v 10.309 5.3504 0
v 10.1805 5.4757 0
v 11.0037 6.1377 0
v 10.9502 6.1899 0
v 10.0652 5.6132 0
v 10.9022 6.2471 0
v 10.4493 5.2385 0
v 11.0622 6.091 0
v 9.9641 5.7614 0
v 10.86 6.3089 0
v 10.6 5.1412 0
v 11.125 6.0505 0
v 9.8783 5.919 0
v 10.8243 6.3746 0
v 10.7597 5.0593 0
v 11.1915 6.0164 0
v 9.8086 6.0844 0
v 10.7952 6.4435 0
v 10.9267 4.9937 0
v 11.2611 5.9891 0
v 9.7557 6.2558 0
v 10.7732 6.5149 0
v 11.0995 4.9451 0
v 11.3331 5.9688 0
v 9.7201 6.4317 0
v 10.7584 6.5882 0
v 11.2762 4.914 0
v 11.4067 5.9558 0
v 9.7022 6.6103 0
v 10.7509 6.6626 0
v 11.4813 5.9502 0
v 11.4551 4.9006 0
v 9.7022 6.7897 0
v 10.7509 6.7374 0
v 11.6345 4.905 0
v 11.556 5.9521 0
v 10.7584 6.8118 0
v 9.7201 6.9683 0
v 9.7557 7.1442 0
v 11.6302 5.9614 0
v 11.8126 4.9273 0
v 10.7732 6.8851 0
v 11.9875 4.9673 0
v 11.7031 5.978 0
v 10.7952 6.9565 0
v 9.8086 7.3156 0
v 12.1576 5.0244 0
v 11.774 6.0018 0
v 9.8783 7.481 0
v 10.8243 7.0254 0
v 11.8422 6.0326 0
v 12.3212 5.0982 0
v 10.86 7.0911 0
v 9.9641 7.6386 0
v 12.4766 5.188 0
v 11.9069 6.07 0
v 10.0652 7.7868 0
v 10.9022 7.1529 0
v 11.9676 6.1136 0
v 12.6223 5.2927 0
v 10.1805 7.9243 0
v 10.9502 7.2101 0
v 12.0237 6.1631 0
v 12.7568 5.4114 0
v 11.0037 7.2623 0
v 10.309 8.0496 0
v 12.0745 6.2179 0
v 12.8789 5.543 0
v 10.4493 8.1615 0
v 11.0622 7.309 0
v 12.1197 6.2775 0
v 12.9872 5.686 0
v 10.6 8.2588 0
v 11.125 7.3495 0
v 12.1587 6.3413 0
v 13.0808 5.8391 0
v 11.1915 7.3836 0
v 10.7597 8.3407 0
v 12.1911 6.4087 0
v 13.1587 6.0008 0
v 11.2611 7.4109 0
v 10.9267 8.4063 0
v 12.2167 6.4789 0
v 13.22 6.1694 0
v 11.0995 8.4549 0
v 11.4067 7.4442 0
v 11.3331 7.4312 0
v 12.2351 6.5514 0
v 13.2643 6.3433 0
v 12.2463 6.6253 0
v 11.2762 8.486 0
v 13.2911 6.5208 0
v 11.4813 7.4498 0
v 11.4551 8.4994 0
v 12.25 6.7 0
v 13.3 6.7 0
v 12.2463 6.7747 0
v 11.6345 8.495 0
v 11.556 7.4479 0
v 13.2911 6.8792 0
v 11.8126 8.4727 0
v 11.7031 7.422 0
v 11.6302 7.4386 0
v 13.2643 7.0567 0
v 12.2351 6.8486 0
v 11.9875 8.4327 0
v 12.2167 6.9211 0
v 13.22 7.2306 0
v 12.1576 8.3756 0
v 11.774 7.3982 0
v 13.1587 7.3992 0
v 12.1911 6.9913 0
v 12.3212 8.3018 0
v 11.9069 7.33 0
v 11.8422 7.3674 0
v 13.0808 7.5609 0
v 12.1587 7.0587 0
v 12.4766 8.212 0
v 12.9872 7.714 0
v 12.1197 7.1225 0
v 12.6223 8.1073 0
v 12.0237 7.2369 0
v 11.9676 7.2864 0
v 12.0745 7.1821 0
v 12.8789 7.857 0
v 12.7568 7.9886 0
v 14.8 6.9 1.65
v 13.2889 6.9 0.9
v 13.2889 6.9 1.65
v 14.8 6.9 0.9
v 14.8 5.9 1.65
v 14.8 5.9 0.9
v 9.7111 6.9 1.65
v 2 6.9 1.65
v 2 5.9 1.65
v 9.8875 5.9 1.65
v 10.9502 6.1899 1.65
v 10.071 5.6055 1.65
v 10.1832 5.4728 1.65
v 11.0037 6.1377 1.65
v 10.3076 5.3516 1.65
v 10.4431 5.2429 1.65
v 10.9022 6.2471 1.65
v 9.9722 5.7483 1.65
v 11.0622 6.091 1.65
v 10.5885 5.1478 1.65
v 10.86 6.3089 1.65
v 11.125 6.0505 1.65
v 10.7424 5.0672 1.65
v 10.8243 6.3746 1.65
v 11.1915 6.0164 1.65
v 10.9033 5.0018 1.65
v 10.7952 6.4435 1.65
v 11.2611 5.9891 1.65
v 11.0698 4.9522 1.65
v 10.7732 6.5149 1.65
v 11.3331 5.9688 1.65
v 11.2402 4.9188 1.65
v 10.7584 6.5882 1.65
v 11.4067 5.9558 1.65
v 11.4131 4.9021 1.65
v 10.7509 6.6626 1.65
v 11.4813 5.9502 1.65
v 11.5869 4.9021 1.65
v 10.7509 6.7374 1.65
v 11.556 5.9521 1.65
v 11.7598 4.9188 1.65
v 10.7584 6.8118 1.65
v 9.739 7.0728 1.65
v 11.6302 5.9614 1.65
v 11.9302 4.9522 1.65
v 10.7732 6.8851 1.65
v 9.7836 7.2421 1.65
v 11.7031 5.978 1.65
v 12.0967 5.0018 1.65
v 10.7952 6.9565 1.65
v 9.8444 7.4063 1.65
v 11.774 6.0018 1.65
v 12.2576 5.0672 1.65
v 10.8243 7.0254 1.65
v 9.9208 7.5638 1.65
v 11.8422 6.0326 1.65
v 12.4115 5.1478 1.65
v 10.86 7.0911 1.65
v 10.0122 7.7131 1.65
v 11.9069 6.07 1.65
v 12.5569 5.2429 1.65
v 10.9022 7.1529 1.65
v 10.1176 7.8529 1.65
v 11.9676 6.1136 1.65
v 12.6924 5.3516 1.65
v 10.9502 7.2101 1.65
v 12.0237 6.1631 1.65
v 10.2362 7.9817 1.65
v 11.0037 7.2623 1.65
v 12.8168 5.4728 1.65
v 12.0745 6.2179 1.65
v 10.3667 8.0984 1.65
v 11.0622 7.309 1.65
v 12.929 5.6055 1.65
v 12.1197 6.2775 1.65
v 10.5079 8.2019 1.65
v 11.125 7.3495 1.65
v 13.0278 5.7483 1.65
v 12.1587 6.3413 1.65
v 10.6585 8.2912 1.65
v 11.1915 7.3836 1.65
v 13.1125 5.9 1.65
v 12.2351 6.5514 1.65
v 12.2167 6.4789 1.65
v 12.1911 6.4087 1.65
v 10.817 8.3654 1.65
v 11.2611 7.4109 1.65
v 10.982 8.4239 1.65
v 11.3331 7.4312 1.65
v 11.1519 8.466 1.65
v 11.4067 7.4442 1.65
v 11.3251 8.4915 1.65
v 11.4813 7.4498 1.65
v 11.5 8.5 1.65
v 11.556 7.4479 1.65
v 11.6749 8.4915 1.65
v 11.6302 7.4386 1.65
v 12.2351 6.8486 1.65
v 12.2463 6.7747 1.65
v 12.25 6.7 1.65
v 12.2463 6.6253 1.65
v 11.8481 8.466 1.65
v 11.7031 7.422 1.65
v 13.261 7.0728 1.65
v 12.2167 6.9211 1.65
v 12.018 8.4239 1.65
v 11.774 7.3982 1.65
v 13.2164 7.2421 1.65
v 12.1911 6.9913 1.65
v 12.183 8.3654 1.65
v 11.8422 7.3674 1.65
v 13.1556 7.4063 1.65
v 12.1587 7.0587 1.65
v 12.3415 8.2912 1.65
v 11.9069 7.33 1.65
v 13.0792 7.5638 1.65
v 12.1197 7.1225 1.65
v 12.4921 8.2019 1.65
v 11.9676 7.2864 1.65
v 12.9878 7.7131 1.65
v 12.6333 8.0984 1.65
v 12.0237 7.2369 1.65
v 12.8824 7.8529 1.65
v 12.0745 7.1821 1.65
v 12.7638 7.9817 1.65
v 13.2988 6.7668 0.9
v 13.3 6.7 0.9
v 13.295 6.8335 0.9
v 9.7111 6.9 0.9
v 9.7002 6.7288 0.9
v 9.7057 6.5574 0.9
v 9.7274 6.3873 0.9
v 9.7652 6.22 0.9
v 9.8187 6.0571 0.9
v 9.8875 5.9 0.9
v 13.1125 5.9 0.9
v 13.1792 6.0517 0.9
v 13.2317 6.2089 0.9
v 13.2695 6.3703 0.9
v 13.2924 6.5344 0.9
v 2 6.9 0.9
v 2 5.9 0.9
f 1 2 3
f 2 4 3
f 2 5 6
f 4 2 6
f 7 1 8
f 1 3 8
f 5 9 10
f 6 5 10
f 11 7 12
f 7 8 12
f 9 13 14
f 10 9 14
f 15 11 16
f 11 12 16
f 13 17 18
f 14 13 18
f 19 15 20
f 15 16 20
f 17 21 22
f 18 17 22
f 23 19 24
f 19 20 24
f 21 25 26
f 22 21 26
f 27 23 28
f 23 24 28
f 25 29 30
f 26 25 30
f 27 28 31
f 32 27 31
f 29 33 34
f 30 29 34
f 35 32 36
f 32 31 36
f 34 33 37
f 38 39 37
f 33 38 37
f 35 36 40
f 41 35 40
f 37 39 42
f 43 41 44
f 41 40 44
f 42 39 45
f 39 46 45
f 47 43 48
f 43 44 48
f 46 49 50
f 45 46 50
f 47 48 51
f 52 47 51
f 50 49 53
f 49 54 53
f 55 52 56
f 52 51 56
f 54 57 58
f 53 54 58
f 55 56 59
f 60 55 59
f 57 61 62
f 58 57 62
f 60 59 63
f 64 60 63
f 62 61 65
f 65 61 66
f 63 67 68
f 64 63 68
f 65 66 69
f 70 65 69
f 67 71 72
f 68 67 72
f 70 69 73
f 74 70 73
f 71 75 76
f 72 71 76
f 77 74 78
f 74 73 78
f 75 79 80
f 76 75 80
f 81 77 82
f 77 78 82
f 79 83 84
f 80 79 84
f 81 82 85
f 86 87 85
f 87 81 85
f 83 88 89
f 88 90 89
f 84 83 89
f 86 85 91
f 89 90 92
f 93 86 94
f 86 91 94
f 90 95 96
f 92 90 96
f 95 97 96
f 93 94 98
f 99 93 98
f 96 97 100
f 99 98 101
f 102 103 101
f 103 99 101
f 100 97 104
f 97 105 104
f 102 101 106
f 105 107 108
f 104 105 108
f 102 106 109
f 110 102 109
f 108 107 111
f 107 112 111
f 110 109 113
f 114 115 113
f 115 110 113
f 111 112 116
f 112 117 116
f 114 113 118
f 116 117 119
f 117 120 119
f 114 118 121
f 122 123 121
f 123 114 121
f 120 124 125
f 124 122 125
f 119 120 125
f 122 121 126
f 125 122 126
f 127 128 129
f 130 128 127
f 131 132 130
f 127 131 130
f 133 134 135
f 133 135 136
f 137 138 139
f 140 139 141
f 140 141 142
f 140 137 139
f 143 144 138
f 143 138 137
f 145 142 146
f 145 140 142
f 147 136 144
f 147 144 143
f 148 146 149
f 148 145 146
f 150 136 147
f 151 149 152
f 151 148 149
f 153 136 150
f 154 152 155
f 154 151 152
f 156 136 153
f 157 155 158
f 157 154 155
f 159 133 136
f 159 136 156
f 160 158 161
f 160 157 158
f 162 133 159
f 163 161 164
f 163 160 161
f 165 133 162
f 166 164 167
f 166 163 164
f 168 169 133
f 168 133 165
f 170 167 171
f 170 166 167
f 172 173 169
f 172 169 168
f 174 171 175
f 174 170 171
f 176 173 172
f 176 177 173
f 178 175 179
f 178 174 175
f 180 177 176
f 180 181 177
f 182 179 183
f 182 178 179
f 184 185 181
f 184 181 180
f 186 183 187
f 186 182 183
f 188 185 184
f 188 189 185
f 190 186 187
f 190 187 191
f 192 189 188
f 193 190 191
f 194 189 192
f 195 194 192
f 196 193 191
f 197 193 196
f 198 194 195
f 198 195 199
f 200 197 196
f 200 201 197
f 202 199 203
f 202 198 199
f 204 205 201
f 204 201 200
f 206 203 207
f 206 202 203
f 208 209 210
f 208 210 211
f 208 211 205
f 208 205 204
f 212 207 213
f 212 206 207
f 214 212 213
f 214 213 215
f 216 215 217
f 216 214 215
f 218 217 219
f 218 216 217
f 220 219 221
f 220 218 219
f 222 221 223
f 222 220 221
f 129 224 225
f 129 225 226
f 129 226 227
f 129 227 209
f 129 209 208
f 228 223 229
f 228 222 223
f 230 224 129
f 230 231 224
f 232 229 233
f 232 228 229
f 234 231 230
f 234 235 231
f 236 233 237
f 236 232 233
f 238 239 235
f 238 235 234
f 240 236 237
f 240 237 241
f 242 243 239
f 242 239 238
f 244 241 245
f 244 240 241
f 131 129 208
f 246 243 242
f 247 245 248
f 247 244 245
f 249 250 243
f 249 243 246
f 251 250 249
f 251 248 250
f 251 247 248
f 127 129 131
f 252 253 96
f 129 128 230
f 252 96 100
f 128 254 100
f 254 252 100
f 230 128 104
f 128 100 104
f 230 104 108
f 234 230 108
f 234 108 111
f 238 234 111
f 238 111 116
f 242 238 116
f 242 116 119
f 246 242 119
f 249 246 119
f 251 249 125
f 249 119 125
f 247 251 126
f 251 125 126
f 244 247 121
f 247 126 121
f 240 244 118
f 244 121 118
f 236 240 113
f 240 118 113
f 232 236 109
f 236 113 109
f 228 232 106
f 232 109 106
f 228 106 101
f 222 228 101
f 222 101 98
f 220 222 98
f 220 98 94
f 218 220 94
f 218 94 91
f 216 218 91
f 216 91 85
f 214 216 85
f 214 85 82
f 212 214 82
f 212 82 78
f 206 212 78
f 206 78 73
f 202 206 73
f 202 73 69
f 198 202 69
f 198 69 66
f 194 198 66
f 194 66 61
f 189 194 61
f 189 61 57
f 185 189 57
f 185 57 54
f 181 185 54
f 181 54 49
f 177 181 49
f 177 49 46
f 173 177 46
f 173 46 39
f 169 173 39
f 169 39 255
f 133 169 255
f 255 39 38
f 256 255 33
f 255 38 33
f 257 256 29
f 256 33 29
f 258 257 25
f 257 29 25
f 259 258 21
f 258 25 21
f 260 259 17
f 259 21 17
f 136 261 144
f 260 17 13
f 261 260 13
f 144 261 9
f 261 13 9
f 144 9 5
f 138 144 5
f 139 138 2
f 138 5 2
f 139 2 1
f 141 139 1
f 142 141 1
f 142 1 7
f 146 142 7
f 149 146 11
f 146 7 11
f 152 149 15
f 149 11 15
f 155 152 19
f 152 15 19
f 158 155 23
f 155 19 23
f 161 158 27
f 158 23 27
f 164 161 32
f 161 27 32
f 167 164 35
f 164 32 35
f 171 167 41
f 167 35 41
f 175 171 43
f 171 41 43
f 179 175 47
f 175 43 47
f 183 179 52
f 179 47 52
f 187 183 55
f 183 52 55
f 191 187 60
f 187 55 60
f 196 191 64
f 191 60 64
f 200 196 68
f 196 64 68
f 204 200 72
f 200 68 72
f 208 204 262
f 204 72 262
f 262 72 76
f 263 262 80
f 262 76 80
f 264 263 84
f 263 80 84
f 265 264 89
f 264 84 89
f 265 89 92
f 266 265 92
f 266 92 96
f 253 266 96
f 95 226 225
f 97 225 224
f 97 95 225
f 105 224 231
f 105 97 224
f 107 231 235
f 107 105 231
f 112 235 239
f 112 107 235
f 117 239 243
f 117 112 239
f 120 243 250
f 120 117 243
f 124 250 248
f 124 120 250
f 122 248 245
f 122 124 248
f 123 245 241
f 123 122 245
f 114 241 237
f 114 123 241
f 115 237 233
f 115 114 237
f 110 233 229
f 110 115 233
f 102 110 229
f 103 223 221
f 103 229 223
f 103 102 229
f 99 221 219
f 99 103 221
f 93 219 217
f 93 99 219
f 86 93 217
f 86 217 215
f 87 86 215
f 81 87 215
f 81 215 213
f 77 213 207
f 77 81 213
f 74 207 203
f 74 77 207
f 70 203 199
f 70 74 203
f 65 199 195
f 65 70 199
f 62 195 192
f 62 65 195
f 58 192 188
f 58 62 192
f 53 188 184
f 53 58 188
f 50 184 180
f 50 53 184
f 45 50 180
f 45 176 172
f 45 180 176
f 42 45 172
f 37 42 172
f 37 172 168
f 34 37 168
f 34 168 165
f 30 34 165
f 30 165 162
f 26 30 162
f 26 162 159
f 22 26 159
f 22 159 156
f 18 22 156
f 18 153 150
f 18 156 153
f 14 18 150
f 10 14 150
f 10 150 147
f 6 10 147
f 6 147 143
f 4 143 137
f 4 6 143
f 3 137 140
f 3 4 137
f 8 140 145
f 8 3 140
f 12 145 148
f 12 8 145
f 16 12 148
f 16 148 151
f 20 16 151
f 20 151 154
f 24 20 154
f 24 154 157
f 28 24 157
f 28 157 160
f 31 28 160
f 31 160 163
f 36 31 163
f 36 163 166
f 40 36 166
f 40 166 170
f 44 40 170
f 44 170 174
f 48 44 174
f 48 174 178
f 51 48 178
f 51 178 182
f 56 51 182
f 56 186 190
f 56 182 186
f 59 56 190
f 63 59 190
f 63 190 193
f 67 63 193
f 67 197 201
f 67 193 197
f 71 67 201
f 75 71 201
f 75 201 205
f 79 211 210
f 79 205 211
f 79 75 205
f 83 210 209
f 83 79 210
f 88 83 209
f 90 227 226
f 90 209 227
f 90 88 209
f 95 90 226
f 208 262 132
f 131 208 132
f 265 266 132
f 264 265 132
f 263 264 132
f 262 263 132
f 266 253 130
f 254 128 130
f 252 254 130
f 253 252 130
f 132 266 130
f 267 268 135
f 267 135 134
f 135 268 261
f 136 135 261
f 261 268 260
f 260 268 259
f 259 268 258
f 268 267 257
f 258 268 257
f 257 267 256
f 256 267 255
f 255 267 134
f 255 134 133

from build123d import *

# Parameters (mm, degrees)
CYLINDER002_R     = 0.75
CYLINDER002_DEPTH = 10
BOX005_W          = 12.8
BOX005_H          = 1
BOX005_DEPTH      = 0.75
CYLINDER001_R     = 1.8
CYLINDER001_DEPTH = 1.65


with BuildPart() as cylinder002:
    # Cylinder002 → Cylinder002 (new body)
    with BuildSketch(Plane(origin=(11.5, 6.7, 0), x_dir=(1, 0, 0), z_dir=(0, 0, 1))):
        Circle(CYLINDER002_R)
    extrude(amount=CYLINDER002_DEPTH)


with BuildPart() as sk1:
    # Box005 → Box005 (new body)
    with BuildSketch(Plane(origin=(2, 5.9, 0.9), x_dir=(1, 0, 0), z_dir=(0, 0, 1))):
        with Locations((6.4, 0.5)):
            Rectangle(BOX005_W, BOX005_H)
    extrude(amount=BOX005_DEPTH)


with BuildPart() as cut001:
    # Cylinder001 → Cylinder001 (new body)
    with BuildSketch(Plane(origin=(11.5, 6.7, 0), x_dir=(1, 0, 0), z_dir=(0, 0, 1))):
        Circle(CYLINDER001_R)
    extrude(amount=CYLINDER001_DEPTH)

    # Fusion001: union sk1
    add(sk1.part)

    # Cut001: cut Cylinder002
    add(cylinder002.part, mode=Mode.SUBTRACT)


solid = cut001.part
